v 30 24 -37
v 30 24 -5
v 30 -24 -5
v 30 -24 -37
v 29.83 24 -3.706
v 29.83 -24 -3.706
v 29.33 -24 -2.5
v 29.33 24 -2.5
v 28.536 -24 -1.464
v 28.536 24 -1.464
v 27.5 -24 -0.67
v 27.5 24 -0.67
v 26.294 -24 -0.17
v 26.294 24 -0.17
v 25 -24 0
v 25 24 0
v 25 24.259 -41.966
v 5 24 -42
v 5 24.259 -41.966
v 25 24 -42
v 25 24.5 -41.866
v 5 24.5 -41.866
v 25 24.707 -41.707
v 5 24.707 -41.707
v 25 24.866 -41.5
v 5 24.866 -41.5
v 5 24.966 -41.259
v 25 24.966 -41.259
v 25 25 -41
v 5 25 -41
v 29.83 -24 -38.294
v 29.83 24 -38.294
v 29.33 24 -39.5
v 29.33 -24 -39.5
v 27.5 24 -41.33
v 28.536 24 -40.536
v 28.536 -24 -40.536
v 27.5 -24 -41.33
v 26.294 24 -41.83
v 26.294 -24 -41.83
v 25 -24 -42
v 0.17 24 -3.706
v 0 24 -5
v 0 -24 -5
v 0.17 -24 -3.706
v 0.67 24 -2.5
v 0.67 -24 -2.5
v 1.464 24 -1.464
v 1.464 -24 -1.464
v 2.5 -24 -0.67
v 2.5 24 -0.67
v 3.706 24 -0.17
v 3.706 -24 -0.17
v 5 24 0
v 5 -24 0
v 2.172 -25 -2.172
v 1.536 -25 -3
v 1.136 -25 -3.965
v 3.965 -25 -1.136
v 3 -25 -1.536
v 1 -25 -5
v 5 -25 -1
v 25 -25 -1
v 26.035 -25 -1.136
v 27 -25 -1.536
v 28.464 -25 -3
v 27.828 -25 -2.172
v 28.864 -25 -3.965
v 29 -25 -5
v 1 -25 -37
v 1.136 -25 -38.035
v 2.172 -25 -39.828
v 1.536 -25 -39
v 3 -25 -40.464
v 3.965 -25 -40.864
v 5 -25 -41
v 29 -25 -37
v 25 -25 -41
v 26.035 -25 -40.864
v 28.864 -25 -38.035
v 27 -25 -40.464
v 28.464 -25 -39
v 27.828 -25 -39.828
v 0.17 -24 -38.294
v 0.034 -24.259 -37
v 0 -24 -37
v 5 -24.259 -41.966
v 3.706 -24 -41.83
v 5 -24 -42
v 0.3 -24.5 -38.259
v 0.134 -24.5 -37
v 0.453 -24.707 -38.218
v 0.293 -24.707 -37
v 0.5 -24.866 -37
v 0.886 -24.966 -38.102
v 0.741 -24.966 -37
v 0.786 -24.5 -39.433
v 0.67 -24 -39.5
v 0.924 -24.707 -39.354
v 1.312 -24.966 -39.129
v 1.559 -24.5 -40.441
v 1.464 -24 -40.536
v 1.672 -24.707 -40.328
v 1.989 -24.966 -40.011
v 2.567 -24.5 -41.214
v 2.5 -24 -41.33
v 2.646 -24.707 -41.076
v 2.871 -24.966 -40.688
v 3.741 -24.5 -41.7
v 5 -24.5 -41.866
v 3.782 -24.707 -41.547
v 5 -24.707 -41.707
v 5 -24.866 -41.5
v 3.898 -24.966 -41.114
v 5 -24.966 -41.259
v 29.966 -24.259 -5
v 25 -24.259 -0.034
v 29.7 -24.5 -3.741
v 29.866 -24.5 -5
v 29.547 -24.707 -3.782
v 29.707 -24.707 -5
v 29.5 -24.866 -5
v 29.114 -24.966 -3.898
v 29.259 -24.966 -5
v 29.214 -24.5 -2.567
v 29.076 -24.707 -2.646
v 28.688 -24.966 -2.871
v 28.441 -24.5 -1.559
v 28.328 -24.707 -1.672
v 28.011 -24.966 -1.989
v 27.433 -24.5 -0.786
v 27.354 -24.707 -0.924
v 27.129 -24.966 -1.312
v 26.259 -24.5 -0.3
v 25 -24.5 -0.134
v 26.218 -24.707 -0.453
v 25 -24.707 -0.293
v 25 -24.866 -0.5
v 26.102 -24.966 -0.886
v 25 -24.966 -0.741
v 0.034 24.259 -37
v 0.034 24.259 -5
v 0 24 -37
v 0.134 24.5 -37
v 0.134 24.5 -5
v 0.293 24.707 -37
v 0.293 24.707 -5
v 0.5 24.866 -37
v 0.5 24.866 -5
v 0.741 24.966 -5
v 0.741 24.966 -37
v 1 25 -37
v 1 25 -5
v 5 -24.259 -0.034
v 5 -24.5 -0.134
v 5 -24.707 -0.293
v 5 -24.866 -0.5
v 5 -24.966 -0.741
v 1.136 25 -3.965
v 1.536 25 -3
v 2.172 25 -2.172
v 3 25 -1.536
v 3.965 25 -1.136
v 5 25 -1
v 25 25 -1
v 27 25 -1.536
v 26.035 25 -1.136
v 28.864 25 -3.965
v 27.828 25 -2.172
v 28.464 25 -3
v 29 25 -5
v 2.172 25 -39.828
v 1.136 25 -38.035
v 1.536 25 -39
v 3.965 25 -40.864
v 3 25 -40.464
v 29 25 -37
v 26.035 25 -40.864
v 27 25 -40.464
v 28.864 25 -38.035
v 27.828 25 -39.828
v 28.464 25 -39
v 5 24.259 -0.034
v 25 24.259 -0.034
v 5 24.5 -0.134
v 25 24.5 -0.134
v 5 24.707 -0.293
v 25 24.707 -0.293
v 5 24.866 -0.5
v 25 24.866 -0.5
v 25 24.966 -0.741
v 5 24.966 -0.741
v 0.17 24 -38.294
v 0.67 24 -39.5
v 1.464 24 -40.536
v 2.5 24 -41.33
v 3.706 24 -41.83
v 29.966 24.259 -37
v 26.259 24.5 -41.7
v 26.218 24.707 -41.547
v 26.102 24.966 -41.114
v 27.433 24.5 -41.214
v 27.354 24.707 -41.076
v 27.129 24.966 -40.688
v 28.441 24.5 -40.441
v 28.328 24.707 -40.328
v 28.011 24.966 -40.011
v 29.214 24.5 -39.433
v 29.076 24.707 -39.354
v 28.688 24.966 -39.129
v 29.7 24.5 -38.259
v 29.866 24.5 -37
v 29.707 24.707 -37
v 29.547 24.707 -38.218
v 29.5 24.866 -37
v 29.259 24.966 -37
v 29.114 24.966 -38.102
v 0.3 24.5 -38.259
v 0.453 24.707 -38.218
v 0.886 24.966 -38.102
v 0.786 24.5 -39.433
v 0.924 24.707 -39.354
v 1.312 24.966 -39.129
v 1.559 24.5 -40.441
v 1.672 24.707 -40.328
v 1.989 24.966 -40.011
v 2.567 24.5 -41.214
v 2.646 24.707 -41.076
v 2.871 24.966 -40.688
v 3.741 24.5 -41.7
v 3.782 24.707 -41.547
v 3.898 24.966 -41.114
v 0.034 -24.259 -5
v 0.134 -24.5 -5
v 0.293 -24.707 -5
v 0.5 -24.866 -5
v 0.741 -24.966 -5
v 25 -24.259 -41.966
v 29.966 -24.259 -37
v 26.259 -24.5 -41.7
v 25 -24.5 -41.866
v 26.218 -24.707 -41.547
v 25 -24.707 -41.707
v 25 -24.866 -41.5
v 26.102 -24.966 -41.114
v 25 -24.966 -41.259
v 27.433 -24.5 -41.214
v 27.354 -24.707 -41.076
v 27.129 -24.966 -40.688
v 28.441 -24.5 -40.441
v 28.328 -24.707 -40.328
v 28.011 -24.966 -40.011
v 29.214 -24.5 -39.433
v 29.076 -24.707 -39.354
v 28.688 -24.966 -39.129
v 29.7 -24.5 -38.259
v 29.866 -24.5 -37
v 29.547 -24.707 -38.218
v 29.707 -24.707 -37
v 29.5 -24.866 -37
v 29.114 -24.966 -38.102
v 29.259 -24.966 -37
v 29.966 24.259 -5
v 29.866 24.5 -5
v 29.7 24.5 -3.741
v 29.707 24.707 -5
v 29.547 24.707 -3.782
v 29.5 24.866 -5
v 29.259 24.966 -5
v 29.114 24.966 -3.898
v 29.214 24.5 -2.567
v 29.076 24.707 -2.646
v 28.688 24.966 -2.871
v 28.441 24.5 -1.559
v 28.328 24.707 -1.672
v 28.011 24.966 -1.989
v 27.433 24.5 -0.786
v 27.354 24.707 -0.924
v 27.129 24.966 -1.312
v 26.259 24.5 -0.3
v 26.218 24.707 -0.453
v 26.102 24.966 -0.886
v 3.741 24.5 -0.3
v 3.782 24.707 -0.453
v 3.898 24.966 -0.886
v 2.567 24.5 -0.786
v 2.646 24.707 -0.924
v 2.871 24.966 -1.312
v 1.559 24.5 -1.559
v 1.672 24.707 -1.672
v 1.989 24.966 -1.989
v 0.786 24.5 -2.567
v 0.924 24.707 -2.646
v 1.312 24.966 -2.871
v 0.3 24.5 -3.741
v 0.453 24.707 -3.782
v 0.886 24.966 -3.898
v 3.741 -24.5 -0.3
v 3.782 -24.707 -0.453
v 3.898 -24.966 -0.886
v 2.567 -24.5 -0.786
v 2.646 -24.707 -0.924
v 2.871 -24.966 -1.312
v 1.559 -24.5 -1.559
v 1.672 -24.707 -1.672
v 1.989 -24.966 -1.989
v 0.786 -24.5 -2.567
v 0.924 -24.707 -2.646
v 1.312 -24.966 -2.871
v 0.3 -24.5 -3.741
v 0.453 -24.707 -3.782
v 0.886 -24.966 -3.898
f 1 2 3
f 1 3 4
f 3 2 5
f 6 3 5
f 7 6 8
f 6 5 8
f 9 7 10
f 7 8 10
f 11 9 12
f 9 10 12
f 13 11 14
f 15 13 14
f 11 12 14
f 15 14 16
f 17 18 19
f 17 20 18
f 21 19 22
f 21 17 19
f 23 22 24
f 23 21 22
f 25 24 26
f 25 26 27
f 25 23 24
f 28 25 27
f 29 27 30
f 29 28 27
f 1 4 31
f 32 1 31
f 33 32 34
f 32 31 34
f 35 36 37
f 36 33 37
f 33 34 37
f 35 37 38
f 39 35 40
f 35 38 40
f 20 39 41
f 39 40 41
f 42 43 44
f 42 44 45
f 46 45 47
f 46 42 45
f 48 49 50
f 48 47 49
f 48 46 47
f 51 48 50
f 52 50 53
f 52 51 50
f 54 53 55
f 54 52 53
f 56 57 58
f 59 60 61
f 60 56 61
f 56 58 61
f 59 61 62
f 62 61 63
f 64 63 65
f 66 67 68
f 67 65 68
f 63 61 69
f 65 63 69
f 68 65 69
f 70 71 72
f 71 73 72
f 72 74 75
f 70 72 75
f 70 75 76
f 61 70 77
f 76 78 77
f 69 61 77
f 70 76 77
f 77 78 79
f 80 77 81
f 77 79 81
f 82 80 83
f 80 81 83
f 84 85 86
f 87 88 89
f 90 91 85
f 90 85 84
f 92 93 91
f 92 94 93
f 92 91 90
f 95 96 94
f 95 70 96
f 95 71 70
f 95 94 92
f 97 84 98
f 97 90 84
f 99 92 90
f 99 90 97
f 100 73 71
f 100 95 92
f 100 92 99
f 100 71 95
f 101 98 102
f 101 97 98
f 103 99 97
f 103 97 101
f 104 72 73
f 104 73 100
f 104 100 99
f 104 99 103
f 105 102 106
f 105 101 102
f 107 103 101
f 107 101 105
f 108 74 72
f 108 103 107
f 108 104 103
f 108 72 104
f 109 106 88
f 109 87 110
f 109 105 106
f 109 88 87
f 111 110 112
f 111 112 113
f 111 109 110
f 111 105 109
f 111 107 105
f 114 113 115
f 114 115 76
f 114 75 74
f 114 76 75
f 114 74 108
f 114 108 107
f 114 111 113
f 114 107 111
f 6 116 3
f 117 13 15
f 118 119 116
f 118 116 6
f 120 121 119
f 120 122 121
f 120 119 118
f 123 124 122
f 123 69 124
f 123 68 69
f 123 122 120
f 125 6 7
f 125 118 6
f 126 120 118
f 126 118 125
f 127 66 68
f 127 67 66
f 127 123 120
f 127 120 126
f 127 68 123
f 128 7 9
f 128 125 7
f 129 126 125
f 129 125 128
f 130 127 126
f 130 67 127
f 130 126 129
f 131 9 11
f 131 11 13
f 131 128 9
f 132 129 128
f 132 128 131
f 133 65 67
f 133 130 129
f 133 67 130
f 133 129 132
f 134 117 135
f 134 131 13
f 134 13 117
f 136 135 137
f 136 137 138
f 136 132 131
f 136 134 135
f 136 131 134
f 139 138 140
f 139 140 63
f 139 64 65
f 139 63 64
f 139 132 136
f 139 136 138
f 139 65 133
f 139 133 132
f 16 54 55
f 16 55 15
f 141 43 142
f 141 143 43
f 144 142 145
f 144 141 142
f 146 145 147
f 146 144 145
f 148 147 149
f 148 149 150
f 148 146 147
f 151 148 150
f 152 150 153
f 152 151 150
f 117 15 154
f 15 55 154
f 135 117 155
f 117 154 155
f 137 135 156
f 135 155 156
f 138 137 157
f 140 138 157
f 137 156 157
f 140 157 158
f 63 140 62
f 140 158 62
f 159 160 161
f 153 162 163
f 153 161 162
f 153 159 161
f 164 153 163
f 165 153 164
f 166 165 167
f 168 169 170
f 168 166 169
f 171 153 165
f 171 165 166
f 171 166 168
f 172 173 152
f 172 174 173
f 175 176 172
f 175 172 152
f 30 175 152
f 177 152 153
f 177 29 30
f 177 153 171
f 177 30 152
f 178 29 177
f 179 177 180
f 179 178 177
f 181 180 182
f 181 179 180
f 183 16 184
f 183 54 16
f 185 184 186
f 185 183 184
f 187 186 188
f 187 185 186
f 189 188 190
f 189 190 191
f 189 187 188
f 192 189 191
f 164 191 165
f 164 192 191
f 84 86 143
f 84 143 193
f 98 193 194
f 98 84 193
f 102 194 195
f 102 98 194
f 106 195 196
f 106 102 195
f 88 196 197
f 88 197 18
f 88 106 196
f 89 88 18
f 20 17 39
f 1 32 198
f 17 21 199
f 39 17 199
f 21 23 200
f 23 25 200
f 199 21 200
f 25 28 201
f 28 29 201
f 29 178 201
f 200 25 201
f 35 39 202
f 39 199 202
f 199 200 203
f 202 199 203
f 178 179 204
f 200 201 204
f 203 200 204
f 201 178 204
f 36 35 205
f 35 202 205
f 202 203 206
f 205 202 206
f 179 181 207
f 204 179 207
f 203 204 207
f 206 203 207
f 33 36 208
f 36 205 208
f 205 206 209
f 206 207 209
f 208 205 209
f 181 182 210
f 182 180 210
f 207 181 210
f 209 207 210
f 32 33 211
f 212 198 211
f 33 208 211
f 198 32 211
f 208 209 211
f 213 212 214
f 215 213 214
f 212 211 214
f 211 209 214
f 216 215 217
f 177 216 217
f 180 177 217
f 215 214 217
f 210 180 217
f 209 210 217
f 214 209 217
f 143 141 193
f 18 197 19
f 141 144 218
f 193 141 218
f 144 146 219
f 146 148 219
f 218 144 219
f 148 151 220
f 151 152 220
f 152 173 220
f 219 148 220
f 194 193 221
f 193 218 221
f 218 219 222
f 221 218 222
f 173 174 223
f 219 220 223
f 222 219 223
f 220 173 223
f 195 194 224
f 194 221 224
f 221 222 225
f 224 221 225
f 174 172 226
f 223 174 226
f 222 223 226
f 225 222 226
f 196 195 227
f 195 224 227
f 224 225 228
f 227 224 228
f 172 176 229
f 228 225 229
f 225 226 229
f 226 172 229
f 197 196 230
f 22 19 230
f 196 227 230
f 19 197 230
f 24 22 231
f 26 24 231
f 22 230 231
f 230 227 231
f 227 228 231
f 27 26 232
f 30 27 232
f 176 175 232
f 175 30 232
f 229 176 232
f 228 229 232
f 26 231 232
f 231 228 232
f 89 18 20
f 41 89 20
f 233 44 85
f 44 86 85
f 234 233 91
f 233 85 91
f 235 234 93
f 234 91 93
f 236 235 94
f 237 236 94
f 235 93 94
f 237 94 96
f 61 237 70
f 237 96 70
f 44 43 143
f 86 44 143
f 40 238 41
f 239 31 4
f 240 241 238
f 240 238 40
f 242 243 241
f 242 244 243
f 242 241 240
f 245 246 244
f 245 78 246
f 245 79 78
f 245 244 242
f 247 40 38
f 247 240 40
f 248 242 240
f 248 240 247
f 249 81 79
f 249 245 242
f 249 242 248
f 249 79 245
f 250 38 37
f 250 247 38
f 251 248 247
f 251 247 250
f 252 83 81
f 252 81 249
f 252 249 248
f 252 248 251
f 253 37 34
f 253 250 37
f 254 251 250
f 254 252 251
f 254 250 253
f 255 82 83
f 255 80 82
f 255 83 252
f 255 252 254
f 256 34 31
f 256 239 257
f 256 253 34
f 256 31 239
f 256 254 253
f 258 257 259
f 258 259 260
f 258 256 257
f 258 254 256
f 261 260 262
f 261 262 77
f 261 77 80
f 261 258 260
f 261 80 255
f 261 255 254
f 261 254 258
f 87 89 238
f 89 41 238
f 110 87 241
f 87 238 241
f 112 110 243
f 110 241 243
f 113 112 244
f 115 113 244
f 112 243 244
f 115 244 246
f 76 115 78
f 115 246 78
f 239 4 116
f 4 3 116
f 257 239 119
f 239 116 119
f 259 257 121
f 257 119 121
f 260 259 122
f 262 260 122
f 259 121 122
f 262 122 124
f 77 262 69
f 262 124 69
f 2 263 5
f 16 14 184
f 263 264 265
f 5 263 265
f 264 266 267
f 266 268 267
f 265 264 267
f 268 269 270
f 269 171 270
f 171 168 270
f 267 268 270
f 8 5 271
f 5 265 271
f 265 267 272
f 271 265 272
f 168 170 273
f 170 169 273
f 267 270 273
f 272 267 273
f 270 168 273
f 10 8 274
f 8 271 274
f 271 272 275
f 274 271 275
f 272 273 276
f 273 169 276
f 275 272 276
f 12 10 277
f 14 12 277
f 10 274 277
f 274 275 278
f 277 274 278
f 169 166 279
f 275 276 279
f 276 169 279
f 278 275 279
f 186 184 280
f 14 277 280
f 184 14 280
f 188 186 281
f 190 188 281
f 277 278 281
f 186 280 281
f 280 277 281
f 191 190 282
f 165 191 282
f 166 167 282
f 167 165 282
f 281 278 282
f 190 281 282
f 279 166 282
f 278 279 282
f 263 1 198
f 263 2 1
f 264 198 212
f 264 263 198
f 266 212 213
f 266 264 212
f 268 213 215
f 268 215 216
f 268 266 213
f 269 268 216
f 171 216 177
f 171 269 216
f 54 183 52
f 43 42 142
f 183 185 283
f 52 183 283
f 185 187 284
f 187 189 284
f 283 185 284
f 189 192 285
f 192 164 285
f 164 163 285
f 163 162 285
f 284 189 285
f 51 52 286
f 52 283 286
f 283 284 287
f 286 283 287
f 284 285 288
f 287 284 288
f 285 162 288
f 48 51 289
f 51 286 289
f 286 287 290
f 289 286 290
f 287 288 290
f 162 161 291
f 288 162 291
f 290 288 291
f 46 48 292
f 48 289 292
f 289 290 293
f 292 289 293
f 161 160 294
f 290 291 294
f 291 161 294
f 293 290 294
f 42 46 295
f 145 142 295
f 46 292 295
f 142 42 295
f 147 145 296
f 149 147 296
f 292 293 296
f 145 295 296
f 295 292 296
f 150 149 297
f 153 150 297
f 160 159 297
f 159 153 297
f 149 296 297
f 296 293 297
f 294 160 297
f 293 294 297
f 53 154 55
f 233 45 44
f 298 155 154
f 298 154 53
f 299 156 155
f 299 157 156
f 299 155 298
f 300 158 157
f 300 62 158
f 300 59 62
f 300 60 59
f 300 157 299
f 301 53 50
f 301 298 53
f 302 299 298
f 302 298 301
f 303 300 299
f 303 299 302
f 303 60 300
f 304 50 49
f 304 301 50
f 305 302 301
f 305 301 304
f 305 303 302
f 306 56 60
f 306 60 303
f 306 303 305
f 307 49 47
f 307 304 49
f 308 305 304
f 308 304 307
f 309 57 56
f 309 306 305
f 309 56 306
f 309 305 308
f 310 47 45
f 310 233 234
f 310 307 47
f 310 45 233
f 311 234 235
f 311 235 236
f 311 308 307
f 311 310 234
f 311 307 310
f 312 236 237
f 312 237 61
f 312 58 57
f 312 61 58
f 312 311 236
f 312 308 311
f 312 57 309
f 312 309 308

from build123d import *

# Parameters (mm, degrees)
SKETCH1_W           = 30
SKETCH1_H           = 42
BOSS_EXTRUDE1_DEPTH = 25
FILLET1_R           = 5
FILLET2_R           = 1
FILLET3_R           = 1


with BuildPart() as part:
    # Sketch1 → Boss-Extrude1 (new body, symmetric)
    with BuildSketch(Plane(origin=(0, 0, 0), x_dir=(1, 0, 0), z_dir=(0, 1, 0))):
        with Locations((15, 21)):
            Rectangle(SKETCH1_W, SKETCH1_H)
    extrude(amount=BOSS_EXTRUDE1_DEPTH, both=True)

    # Fillet1
    fillet1_edges = [part.edges().sort_by_distance(p)[0] for p in [
        (0, 0, -42),
        (30, 0, -42),
        (30, 0, 0),
        (0, 0, 0),
    ]]
    fillet(fillet1_edges, radius=FILLET1_R)

    # Fillet2
    fillet2_edges = [part.edges().sort_by_distance(p)[0] for p in [
        (0, 25, -21),
        (15, 25, -42),
        (15, 25, 0),
        (30, 25, -21),
        (28.535533906, 25, -1.464466094),
        (28.535533906, 25, -40.535533906),
        (1.464466094, 25, -1.464466094),
        (1.464466094, 25, -40.535533906),
    ]]
    fillet(fillet2_edges, radius=FILLET2_R)

    # Fillet3
    fillet3_edges = [part.edges().sort_by_distance(p)[0] for p in [
        (0, -25, -21),
        (15, -25, -42),
        (30, -25, -21),
        (15, -25, 0),
        (28.535533906, -25, -1.464466094),
        (28.535533906, -25, -40.535533906),
        (1.464466094, -25, -1.464466094),
        (1.464466094, -25, -40.535533906),
    ]]
    fillet(fillet3_edges, radius=FILLET3_R)


solid = part.part
